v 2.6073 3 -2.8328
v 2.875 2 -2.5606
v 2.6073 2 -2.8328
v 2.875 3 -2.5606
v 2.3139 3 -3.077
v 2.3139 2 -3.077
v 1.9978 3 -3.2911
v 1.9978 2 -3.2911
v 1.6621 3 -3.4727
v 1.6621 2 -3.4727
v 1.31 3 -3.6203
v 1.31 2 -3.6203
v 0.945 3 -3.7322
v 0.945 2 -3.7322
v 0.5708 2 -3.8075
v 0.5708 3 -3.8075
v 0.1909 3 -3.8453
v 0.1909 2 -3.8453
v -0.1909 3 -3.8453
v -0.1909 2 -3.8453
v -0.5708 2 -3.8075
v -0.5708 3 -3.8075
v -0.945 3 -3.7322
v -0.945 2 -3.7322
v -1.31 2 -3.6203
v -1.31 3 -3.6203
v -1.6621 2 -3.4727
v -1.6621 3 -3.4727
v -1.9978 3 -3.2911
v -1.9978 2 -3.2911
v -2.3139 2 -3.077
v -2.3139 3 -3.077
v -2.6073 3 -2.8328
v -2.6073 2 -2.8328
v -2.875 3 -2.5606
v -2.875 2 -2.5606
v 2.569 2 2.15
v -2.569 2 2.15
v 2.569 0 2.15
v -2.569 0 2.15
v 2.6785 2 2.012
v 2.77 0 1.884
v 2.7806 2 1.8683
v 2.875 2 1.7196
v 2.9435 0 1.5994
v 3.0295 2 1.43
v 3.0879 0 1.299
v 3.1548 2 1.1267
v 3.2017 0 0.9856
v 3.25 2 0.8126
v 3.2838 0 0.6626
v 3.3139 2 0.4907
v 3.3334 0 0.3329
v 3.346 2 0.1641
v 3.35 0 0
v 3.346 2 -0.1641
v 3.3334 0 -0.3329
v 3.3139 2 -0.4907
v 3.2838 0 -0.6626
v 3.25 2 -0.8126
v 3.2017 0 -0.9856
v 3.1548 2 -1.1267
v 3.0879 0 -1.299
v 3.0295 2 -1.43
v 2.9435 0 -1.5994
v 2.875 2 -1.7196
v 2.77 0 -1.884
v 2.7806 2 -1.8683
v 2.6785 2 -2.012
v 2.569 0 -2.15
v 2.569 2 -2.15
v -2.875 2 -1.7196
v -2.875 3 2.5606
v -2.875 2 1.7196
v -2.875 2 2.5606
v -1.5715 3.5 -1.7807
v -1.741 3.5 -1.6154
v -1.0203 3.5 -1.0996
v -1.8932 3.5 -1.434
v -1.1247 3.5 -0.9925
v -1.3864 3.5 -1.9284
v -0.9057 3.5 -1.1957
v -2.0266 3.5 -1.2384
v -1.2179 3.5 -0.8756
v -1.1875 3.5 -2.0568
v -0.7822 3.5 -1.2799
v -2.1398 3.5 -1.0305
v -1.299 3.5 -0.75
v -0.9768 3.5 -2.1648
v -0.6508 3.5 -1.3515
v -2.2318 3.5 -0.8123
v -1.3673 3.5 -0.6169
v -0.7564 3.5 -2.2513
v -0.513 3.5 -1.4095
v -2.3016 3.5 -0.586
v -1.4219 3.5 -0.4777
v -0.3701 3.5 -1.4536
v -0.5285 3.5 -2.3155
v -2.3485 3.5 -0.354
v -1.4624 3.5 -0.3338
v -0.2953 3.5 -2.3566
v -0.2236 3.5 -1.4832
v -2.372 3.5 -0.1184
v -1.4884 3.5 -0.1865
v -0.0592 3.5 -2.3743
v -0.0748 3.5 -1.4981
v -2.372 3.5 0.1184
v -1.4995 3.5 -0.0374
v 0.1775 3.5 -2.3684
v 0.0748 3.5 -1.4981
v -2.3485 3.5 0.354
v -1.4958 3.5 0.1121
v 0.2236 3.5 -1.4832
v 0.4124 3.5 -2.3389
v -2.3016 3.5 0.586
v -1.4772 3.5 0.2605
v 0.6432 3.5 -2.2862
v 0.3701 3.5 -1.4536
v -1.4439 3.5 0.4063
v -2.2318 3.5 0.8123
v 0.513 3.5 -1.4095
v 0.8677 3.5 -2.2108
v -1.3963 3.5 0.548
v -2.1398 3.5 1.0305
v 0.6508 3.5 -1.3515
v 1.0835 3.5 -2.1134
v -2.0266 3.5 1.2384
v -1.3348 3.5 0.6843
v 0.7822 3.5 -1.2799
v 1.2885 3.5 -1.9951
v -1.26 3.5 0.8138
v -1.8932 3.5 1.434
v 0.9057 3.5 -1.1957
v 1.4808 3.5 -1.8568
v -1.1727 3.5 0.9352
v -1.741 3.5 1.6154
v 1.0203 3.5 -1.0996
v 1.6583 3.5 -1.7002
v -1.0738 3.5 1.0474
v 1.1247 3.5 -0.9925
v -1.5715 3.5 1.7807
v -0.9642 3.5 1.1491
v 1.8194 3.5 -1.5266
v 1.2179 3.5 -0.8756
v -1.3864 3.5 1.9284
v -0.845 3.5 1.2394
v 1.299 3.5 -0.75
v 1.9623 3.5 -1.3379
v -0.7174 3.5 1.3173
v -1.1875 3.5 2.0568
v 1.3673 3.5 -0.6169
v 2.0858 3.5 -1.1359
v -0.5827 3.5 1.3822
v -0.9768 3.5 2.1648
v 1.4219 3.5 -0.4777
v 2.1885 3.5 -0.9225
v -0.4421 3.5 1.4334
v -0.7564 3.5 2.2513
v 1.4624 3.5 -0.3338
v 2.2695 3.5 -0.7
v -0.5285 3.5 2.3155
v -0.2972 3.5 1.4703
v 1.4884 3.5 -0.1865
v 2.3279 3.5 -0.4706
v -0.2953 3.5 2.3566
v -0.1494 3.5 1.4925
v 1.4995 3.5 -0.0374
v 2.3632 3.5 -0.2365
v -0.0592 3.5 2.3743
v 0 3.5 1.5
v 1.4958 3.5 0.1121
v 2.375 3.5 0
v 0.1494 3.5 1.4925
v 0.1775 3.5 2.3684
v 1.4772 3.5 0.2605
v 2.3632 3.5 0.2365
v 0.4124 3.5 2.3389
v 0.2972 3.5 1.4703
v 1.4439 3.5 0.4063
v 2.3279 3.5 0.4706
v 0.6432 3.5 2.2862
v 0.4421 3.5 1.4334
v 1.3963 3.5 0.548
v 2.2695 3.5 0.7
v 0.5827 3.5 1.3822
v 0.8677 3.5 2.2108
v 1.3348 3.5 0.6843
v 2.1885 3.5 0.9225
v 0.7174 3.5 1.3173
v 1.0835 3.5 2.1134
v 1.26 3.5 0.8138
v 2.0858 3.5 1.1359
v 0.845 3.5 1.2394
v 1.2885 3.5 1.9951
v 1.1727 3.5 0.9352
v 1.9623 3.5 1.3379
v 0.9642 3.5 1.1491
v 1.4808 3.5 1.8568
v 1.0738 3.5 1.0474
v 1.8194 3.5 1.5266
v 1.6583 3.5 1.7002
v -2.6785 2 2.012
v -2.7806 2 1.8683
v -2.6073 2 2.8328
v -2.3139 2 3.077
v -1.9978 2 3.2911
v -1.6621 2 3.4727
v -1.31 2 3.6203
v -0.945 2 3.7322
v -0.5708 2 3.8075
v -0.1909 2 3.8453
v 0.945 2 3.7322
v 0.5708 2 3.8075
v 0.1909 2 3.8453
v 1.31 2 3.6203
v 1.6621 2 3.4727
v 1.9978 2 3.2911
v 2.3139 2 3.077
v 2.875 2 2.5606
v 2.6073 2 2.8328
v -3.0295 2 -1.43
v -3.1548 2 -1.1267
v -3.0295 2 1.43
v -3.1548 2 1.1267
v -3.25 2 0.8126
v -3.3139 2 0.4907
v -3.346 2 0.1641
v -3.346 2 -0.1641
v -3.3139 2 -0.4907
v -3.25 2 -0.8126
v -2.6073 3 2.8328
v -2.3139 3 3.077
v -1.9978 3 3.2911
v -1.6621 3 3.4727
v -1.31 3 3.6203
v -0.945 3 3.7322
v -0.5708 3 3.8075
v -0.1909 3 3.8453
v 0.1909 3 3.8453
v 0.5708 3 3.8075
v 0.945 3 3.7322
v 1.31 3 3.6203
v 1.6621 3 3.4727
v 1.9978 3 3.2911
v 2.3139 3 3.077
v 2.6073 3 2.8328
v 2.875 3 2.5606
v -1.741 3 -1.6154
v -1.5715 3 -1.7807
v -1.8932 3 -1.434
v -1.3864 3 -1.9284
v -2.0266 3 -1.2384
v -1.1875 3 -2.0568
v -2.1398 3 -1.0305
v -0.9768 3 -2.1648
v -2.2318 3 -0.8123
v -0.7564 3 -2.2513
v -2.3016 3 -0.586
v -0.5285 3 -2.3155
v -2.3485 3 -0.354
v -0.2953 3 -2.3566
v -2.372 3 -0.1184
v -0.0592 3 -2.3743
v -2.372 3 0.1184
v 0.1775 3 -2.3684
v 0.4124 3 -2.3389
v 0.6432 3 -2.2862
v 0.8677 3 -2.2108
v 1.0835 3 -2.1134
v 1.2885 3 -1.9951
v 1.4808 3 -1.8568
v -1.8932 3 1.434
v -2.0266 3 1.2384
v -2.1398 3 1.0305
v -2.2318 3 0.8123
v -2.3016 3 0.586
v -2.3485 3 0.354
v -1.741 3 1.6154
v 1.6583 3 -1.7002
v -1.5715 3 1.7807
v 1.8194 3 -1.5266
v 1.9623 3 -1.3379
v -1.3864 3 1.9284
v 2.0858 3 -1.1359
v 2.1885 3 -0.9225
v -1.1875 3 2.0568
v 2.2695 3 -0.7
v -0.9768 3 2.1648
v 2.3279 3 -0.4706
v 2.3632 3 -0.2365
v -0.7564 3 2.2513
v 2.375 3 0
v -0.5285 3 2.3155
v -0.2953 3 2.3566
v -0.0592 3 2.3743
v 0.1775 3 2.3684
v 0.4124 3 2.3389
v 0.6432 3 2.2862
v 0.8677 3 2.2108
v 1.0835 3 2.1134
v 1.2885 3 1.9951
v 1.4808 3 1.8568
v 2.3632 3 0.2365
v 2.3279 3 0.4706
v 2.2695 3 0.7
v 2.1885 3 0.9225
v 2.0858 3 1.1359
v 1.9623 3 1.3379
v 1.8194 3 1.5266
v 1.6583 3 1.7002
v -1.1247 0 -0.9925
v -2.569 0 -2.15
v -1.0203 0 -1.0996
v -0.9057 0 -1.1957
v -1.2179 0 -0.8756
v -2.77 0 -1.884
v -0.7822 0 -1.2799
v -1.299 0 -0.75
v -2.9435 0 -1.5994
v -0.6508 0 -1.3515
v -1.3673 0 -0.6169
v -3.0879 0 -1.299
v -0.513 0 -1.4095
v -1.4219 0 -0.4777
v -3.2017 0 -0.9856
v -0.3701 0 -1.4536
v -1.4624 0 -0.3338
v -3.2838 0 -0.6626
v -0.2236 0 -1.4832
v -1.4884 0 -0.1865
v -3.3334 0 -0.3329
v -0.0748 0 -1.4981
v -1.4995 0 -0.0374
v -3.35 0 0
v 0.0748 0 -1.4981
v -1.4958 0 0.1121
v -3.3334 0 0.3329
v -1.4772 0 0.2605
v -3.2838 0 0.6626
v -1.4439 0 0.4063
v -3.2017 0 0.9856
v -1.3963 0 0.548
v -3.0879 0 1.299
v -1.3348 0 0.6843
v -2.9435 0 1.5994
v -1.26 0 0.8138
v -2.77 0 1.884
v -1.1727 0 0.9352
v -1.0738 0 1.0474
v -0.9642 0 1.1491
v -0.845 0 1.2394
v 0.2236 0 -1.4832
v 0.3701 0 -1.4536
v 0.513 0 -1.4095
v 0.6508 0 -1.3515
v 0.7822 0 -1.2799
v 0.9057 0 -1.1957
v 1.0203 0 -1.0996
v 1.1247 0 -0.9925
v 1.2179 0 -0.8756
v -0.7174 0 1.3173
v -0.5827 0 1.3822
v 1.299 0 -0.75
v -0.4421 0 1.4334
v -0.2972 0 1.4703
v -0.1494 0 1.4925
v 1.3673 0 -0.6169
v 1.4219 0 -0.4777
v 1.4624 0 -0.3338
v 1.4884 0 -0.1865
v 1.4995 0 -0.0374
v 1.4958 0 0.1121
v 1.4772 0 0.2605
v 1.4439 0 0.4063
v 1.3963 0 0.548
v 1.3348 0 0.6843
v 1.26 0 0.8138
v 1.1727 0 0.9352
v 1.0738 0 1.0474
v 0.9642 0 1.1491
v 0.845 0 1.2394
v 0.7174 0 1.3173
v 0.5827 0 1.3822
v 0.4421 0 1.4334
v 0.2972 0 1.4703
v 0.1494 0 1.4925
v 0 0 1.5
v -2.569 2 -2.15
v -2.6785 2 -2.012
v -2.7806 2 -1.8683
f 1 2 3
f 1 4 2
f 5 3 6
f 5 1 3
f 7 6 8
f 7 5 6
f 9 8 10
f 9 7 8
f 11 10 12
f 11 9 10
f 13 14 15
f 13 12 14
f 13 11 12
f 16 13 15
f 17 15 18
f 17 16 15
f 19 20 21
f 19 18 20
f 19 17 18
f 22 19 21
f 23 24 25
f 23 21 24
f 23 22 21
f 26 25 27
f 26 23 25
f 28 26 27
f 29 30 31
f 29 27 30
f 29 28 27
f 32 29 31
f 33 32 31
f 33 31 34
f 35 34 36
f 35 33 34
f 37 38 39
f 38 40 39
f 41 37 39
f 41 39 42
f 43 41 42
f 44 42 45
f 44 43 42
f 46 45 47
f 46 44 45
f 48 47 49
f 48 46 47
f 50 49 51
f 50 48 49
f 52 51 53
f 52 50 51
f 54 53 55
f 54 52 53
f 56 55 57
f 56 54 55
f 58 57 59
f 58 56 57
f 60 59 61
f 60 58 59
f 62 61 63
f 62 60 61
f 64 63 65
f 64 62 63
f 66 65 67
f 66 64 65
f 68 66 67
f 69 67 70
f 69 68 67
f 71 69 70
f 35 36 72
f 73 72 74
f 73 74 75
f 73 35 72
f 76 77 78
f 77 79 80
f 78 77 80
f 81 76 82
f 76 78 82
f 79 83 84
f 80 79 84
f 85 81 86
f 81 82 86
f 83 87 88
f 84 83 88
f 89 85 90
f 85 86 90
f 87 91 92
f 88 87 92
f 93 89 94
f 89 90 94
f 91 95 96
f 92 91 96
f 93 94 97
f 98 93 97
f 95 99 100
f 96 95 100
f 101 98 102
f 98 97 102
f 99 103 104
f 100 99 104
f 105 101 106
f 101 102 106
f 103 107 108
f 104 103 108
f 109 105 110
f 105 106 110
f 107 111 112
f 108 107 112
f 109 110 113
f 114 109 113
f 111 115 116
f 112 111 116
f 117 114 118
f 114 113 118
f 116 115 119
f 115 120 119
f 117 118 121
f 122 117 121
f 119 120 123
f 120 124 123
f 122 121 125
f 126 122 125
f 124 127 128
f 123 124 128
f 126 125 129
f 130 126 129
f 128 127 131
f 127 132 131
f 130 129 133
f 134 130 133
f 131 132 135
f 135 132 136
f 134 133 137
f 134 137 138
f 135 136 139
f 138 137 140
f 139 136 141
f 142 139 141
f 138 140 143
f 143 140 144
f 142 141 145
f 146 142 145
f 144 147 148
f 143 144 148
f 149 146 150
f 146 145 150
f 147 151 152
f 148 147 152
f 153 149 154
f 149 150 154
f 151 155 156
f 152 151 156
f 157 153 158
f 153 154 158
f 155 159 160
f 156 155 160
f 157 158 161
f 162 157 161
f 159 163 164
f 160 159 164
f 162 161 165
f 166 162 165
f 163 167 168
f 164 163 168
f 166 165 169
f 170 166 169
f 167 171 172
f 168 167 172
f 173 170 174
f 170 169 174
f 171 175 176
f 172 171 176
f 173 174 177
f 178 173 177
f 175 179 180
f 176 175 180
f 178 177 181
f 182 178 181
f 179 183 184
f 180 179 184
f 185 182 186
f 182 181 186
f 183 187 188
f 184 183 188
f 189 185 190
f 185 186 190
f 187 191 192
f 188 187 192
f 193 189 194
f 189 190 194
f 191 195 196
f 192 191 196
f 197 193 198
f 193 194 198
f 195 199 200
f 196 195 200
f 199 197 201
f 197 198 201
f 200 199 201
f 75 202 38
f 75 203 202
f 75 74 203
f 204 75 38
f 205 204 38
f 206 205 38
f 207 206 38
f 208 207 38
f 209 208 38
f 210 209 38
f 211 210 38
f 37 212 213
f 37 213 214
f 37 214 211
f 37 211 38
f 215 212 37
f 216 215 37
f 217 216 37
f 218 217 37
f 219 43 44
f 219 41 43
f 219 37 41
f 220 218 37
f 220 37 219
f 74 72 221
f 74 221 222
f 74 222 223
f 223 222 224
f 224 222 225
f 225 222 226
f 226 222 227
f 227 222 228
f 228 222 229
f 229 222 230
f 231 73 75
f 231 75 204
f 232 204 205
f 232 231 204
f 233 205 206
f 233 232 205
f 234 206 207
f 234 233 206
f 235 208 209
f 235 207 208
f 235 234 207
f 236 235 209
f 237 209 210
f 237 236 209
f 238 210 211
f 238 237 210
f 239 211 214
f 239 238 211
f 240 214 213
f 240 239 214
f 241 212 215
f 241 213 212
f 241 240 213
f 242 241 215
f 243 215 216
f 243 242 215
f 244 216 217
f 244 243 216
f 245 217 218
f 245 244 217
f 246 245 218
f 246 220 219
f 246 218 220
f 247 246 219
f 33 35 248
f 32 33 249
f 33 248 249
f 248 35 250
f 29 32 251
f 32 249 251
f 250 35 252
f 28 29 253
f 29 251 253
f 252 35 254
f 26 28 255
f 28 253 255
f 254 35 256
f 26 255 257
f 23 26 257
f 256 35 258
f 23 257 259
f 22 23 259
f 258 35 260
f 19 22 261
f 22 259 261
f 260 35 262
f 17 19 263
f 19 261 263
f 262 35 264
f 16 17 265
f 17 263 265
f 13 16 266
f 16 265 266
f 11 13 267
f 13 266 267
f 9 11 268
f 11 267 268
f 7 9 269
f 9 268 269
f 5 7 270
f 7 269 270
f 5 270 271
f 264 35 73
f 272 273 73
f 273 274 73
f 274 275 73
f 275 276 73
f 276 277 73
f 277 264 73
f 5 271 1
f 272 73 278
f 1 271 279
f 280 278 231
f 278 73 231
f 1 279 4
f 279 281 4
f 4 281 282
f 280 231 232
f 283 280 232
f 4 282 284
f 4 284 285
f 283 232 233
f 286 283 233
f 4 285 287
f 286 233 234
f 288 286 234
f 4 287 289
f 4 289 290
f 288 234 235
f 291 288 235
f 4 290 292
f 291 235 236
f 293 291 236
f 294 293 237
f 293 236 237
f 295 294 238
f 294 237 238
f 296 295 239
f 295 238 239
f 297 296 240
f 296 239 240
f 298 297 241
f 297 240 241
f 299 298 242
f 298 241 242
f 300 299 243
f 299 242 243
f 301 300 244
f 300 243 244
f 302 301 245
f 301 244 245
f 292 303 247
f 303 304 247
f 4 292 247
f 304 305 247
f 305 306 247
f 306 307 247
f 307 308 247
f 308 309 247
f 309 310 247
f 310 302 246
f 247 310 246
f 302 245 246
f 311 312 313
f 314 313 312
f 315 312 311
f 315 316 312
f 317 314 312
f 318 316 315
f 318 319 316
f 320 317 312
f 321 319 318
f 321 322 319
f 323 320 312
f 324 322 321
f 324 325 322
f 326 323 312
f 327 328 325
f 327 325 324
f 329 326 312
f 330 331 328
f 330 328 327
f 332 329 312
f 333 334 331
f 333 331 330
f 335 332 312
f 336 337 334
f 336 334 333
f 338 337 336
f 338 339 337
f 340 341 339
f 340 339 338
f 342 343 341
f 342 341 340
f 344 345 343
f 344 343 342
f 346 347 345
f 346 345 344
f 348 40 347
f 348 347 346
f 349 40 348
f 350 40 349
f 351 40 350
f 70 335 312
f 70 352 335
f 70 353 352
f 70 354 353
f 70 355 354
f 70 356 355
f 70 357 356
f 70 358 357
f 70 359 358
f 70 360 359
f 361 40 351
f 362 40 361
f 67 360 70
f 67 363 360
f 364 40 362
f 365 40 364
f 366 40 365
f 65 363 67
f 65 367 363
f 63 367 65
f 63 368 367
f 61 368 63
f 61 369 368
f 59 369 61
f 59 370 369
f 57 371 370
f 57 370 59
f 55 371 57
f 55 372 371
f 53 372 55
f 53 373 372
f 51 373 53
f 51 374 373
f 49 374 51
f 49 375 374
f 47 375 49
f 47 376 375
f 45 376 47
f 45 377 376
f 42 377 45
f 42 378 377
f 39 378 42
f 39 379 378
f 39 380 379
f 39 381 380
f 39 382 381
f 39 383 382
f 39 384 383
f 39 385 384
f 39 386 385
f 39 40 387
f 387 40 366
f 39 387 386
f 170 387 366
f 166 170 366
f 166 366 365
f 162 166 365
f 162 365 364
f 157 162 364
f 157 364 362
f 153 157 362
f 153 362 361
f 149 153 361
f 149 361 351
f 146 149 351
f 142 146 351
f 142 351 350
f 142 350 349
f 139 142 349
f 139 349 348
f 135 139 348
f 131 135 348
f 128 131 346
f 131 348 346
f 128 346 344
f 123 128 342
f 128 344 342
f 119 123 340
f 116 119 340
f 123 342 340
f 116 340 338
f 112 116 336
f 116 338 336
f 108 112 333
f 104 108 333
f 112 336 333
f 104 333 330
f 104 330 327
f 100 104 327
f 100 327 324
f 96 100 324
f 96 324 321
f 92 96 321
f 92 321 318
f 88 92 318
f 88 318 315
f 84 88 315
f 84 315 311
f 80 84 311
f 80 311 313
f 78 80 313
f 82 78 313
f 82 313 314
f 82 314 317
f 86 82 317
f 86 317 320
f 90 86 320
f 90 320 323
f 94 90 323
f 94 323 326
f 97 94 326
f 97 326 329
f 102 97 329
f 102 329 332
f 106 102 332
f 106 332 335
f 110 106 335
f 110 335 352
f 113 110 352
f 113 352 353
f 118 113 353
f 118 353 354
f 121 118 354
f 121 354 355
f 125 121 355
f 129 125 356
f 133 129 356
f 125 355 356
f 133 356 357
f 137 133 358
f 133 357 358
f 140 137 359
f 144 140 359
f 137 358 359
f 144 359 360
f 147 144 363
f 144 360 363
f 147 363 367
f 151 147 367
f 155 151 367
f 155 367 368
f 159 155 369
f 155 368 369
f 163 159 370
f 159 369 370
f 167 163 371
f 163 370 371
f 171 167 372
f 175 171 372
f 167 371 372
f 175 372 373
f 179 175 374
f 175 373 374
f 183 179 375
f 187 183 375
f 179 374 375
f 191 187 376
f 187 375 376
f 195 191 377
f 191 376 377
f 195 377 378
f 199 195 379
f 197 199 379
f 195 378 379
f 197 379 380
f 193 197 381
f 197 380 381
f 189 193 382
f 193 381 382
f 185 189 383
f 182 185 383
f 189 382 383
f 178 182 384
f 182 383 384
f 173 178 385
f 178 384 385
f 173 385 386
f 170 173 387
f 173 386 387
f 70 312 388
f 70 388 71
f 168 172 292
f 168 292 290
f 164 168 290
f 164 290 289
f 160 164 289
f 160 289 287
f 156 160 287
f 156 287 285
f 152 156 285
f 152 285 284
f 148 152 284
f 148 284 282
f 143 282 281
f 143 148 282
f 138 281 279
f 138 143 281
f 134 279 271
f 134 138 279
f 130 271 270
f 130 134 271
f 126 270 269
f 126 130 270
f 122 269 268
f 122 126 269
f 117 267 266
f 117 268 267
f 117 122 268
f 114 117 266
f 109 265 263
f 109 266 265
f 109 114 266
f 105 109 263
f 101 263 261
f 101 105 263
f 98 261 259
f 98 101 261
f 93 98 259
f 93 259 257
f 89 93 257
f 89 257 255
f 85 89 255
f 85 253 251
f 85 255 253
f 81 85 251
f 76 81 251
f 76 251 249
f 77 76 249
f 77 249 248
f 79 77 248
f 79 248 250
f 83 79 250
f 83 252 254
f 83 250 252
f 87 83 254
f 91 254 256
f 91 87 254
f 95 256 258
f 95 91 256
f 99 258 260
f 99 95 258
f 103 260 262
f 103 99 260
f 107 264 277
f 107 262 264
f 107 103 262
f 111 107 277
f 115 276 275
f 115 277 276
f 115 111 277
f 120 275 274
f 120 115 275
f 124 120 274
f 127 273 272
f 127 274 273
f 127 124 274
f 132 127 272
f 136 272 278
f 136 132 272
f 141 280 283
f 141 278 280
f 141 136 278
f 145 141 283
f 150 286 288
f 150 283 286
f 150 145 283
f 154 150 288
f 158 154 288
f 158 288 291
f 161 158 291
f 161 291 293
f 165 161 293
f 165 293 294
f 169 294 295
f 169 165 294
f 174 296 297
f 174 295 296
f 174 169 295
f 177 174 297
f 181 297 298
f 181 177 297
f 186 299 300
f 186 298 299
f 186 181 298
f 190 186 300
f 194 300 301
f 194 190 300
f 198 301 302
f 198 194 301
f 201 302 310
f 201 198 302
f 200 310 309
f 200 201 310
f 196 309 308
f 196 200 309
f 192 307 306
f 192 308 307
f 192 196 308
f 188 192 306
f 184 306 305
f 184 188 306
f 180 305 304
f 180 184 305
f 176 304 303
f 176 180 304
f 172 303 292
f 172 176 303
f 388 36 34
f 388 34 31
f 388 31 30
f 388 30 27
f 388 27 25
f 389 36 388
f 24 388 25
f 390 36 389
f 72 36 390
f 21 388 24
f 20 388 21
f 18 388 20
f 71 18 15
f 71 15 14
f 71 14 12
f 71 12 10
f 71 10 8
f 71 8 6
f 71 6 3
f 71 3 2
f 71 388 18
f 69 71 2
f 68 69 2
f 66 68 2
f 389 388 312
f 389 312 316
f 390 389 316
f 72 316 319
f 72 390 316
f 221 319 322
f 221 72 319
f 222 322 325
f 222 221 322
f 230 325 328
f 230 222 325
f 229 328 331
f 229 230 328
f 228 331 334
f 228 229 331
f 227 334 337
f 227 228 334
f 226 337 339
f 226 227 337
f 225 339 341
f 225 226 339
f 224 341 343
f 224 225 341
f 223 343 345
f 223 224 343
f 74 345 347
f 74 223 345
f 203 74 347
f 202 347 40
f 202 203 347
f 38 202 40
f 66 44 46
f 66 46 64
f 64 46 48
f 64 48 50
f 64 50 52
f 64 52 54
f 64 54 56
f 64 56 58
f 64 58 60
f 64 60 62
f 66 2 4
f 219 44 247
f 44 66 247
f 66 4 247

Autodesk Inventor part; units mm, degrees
ref_plane "YZ Plane" through (0, 0, 0) normal (1, 0, 0) x (0, 1, 0)
ref_plane "XZ Plane" through (0, 0, 0) normal (0, 1, 0) x (-1, 0, 0)
ref_plane "XY Plane" through (0, 0, 0) normal (0, 0, 1) x (1, 0, 0)
sketch "Sketch1" plane through (0, 0, 0) normal (0, 0, 1) x (1, 0, 0)
  line L0 (0, 0) -> (3.35, 0)
  line L1 (3.35, 0) -> (3.35, 2)
  line L2 (3.35, 2) -> (0, 2)
  line L3 (0, 2) -> (0, 0)
  line L4 (0, 2) -> (3.85, 2)
  line L5 (3.85, 2) -> (3.85, 3)
  line L6 (3.85, 3) -> (0, 3)
  line L7 (0, 3) -> (0, 2)
  line L8 (0, 3) -> (2.375, 3)
  line L9 (2.375, 3) -> (2.375, 3.5)
  line L10 (2.375, 3.5) -> (0, 3.5)
  line L11 (0, 3.5) -> (0, 3)
  dimension "d0" = 6.7
  dimension "d1" = 7.7
  dimension "d2" = 4.75
  dimension "d3" = 2
  dimension "d4" = 3
  dimension "d5" = 3.5
revolve "Revolution1" add sketch "Sketch1" angle 360 about axis through (0, 3.5, 0) along (0, -1, 0)
sketch "Sketch2" plane through (0, 3, 0) normal (0, 1, 0) x (1, 0, 0)
  circle A0 centre (0, 0) radius 3.85 projected
  line L0 (-2.875, 2.5606) -> (-2.875, -2.5606)
  line L1 (2.875, 2.5606) -> (2.875, -2.5606)
  dimension "d7" = 5.75
extrude "Extrusion1" cut sketch "Sketch2" against normal up to surface (1 mm away) contours A0 L1 | L0 A0
hole "Hole1" at (0, 3.5, 0) direction (0, -1, 0) diameter 3 end through all
sketch "Sketch3" plane through (0, 0, 0) normal (0, -1, 0) x (1, 0, 0)
  circle A0 centre (0, 0) radius 3.35 projected
  line L0 (4, 2.15) -> (4, 4.15)
  line L1 (4, 4.15) -> (-4, 4.15)
  line L2 (-4, 4.15) -> (-4, 2.15)
  line L3 (-4, 2.15) -> (4, 2.15)
  line L4 (4, -2.15) -> (4, -4.15)
  line L5 (4, -4.15) -> (-4, -4.15)
  line L6 (-4, -4.15) -> (-4, -2.15)
  line L7 (-4, -2.15) -> (4, -2.15)
  line L8 (0, 2.15) -> (0, -2.15) construction
  point P0 (0, 0)
  dimension "d19" = 4.3
  dimension "d20" = 2
  dimension "d21" = 8
extrude "Extrusion2" cut sketch "Sketch3" against normal up to surface (2 mm away) contours L3 A0 | A0 L3 L2 L1 L0 | L7 L4 L5 L6 A0 | A0 L7
properties part number "308-08" material "Polypropylene"
